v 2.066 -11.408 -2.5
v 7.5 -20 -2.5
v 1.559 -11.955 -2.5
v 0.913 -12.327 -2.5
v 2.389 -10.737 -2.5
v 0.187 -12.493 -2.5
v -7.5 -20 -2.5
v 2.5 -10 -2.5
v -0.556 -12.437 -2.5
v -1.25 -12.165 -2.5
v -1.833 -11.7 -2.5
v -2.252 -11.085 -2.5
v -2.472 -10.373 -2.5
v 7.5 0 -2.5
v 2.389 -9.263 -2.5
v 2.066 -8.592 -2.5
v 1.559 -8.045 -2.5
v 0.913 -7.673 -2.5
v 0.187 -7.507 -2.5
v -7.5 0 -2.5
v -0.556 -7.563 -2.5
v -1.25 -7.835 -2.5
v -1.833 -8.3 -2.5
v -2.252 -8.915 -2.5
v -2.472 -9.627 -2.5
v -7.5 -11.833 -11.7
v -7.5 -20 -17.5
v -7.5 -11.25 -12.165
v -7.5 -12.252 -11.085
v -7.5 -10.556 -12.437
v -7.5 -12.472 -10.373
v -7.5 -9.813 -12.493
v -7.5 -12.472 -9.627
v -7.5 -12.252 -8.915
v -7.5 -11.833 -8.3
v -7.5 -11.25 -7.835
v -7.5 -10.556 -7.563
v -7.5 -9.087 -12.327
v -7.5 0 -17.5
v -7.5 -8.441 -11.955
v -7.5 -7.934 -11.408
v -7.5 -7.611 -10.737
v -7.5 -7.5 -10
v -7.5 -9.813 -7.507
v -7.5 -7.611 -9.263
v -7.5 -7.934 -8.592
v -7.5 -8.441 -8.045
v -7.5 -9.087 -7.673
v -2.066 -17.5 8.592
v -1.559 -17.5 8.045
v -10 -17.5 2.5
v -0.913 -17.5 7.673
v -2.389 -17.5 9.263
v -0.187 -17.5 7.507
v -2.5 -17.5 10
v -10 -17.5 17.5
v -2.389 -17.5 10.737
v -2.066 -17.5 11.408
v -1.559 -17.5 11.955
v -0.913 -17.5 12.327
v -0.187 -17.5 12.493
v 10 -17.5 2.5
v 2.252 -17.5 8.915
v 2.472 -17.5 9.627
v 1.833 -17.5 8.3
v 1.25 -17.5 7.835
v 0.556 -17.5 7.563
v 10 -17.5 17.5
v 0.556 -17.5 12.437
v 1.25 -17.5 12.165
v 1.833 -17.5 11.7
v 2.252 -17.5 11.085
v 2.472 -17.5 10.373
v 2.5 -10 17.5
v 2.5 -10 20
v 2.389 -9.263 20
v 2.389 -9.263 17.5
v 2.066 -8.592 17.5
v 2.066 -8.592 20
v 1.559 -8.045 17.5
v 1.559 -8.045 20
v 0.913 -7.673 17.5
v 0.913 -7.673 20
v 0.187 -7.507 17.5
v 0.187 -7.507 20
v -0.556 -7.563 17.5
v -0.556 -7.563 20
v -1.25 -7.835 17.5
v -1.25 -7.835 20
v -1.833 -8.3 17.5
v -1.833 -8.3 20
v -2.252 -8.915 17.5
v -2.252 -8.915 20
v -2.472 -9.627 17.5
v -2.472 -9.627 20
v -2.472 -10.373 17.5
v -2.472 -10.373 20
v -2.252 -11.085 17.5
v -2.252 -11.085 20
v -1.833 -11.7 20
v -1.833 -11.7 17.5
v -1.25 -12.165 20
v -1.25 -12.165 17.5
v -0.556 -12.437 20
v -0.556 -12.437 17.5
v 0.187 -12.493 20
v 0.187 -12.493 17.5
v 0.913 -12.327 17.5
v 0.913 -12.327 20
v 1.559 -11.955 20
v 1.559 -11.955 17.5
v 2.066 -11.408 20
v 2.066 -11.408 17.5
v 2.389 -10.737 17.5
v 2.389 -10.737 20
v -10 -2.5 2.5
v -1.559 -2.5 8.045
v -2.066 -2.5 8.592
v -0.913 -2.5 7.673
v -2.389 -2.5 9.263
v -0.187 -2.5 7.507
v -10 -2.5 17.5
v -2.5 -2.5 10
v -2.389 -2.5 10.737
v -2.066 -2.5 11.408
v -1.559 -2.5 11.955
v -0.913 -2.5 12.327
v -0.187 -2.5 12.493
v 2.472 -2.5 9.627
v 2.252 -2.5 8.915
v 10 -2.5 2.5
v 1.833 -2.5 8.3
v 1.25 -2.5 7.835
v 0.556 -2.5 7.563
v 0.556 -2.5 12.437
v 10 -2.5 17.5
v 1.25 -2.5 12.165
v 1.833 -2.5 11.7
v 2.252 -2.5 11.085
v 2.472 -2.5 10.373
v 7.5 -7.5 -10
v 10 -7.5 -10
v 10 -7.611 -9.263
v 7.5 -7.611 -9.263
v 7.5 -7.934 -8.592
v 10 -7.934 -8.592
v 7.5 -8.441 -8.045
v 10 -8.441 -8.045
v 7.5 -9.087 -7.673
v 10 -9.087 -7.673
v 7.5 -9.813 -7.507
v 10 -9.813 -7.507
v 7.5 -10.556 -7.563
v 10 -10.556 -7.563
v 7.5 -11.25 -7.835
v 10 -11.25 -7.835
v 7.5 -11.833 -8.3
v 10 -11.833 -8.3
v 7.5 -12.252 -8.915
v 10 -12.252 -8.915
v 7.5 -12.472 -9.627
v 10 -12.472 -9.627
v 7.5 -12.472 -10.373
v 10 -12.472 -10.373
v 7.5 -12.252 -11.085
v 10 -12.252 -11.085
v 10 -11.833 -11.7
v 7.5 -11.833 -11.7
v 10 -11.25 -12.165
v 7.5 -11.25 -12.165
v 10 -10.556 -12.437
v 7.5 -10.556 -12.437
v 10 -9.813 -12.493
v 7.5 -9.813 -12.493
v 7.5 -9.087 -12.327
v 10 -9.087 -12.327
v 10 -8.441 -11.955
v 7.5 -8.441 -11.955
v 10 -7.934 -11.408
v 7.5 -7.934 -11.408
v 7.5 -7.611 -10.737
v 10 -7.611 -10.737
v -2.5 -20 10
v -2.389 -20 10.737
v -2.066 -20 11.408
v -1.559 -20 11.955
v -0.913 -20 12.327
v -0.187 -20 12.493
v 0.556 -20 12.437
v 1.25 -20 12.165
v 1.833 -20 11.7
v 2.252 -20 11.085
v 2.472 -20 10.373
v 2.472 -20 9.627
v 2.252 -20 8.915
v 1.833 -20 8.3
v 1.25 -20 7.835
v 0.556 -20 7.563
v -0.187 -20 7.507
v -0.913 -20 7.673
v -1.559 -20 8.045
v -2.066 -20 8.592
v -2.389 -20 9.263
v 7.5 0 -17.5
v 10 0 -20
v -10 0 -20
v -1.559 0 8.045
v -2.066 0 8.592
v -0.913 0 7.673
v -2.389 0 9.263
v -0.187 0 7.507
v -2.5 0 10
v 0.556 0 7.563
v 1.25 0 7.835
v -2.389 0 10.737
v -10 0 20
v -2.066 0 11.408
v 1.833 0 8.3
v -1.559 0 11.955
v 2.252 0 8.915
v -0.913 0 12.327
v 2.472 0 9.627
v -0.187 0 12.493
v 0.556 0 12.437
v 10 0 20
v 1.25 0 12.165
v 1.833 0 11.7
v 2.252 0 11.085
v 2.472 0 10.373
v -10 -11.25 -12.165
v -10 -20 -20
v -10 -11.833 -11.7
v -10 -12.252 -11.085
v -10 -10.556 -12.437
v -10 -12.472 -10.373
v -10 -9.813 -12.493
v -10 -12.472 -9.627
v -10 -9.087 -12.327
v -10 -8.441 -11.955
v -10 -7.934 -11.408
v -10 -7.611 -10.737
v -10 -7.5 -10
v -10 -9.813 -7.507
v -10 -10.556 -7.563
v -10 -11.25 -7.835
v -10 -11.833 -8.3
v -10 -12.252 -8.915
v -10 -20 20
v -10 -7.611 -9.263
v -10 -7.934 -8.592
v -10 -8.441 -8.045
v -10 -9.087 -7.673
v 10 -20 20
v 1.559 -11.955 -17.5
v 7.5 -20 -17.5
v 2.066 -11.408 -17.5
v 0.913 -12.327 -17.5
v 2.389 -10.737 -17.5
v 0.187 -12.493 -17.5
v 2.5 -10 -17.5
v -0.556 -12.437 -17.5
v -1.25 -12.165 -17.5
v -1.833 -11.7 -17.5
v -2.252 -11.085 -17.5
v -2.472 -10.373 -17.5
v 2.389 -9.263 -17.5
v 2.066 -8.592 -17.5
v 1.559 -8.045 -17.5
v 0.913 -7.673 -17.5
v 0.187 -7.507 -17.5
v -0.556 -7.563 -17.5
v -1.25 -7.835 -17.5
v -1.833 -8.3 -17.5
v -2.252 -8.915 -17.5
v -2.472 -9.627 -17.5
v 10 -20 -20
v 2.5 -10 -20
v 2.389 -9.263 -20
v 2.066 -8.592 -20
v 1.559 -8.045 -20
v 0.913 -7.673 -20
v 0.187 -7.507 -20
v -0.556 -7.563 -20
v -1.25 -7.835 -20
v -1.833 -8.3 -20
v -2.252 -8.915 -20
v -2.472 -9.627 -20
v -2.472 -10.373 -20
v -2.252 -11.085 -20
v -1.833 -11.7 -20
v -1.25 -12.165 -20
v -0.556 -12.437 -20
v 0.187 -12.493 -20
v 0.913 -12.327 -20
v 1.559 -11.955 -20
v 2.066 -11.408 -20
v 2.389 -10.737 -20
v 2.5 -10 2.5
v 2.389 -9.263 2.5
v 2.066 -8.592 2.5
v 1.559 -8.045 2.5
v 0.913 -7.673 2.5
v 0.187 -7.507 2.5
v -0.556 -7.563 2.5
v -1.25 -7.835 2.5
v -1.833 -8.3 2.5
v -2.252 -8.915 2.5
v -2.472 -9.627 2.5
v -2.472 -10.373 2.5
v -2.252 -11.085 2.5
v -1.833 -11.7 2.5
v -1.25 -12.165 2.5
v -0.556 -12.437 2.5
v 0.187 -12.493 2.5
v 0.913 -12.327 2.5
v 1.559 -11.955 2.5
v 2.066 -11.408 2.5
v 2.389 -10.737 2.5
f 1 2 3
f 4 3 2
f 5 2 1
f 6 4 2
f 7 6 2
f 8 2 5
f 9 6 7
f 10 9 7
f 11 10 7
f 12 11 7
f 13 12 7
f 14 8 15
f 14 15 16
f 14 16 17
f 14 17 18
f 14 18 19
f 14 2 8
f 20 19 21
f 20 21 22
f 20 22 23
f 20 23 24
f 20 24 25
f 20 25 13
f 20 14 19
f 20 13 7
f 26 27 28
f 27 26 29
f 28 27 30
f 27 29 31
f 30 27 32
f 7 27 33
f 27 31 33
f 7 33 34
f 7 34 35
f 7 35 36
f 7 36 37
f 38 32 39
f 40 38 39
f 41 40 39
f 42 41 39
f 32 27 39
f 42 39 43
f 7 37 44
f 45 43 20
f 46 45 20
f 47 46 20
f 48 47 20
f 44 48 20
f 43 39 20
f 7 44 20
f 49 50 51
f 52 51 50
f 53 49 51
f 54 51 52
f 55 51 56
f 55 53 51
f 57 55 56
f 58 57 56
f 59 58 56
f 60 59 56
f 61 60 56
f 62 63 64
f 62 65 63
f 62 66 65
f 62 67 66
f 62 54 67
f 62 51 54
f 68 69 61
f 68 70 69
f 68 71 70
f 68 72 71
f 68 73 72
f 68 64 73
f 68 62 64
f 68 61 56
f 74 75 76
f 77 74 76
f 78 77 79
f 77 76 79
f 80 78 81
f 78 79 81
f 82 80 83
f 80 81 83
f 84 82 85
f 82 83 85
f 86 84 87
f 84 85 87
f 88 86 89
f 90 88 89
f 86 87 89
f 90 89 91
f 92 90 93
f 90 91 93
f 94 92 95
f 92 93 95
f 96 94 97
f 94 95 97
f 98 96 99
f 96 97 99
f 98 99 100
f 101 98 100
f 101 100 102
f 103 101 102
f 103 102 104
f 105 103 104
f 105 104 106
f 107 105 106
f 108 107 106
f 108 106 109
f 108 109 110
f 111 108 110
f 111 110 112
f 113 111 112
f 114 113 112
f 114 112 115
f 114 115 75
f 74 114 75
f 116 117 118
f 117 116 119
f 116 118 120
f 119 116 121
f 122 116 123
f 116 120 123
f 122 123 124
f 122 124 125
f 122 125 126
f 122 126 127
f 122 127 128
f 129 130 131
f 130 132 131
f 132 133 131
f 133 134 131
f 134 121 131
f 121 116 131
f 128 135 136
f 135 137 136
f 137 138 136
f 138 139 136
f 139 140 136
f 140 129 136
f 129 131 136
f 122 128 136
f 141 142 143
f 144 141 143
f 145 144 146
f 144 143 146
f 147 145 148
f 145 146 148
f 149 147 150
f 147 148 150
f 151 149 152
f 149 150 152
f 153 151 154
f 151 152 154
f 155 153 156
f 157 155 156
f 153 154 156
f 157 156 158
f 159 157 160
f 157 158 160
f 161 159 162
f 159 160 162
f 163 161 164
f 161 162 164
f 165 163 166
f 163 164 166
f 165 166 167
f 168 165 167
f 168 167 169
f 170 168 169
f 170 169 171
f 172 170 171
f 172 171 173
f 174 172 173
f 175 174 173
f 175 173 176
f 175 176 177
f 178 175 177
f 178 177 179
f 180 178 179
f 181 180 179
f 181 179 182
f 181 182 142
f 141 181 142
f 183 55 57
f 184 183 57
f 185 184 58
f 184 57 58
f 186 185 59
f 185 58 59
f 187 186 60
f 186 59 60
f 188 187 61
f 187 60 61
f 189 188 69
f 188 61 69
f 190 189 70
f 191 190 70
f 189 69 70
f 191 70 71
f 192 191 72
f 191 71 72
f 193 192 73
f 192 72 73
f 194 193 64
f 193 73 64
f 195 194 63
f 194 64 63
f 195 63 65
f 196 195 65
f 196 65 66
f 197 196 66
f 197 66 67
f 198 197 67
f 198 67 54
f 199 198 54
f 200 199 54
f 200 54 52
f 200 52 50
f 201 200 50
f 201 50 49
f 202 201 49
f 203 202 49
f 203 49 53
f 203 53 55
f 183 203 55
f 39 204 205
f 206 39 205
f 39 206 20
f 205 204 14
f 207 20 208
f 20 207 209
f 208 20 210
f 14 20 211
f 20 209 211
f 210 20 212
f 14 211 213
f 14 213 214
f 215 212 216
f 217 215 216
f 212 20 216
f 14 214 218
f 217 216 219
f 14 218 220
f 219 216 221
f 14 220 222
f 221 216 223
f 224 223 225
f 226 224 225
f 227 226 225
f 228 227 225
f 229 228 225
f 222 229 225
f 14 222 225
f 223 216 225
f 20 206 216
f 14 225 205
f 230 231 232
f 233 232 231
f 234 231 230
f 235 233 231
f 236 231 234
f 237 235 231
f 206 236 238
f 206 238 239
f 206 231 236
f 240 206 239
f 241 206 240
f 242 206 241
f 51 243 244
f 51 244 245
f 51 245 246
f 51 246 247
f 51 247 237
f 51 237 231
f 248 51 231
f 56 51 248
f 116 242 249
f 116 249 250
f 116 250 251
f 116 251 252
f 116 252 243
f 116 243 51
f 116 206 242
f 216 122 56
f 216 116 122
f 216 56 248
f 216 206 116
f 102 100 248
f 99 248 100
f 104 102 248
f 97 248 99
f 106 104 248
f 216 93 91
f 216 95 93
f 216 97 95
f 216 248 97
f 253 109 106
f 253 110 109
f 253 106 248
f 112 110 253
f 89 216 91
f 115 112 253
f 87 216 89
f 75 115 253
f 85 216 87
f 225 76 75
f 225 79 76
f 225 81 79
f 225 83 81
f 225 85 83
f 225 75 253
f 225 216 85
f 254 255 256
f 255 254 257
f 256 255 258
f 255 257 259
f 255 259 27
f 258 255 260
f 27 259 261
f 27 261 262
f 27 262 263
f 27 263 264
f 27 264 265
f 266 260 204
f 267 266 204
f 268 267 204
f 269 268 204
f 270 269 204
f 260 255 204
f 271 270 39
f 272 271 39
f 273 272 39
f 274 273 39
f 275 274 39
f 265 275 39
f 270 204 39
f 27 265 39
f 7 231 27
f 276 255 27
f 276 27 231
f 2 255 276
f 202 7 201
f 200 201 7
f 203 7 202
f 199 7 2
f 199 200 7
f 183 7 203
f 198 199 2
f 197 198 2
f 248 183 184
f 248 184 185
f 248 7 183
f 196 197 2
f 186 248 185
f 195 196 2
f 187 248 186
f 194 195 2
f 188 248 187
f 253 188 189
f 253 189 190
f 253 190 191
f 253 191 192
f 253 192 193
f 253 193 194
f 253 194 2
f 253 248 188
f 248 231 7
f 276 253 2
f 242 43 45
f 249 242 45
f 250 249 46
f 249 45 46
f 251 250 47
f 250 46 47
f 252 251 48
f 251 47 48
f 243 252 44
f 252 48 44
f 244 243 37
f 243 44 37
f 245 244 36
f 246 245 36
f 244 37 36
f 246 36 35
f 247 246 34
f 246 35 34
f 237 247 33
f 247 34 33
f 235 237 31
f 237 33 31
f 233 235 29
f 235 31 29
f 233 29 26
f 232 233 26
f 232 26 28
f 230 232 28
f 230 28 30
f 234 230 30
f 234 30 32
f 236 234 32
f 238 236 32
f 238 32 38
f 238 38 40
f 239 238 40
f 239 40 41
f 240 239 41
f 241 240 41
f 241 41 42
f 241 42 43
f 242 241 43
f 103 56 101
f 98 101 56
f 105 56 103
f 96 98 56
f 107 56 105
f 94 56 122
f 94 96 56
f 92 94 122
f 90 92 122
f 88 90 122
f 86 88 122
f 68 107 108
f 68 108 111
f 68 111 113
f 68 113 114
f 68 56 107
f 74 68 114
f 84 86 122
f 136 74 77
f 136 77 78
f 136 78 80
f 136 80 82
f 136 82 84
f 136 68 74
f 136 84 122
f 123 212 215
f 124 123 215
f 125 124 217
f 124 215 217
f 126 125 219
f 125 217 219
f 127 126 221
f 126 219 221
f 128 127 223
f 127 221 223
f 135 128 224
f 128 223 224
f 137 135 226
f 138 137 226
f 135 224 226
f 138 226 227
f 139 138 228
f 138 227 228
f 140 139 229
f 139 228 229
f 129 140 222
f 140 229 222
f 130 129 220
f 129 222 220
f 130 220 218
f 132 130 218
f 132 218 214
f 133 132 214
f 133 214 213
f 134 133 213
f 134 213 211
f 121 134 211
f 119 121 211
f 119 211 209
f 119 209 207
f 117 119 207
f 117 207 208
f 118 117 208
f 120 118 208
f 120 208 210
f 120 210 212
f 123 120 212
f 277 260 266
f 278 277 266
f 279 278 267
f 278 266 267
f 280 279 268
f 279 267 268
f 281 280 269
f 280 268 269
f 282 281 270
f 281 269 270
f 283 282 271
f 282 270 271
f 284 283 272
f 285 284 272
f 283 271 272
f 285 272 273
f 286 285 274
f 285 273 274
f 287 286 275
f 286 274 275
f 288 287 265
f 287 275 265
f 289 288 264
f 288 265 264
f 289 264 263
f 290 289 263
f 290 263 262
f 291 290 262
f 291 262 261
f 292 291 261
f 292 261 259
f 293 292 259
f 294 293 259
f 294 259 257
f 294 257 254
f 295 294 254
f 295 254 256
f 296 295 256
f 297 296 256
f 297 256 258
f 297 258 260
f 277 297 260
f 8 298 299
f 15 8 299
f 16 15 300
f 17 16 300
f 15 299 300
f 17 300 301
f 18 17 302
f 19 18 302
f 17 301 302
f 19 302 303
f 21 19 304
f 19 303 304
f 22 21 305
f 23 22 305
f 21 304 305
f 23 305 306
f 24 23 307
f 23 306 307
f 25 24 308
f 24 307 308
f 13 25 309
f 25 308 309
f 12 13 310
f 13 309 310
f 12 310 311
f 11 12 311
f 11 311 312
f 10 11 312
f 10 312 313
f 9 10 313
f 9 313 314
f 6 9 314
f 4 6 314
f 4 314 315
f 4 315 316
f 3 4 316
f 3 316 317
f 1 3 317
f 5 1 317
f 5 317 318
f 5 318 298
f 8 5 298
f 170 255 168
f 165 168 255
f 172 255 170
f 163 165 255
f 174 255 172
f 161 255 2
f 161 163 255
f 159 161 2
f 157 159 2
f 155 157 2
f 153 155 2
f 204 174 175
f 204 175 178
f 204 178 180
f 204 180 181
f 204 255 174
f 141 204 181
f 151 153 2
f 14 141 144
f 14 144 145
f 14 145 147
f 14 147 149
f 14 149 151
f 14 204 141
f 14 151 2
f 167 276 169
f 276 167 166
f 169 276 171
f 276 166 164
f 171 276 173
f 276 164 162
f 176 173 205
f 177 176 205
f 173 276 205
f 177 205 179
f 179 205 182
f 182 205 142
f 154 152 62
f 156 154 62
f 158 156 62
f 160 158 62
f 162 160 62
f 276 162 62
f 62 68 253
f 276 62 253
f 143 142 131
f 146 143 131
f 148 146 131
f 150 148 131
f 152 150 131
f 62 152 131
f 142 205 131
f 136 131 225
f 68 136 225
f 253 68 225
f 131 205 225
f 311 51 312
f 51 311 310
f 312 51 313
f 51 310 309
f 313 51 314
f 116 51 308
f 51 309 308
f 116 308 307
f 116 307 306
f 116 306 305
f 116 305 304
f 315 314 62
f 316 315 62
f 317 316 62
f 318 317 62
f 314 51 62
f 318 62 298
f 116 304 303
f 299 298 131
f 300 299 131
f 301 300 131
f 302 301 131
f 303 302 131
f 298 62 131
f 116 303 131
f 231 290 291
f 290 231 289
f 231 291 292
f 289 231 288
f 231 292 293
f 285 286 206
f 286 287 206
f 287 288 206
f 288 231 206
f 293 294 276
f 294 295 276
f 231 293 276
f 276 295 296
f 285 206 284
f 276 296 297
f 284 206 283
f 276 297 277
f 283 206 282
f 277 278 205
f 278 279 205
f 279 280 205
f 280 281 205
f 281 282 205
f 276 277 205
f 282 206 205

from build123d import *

# Parameters (mm, degrees)
F0_W     = 20
F0_H     = 40
F1_DEPTH = 20
F2_W     = 15
F2_H     = 15
F2_R     = 2.5
F3_DEPTH = 20.001
F4_W     = 15
F4_H     = 15
F4_R     = 2.5
F5_DEPTH = 20.001
F6_R     = 2.5
F7_DEPTH = 40.001


with BuildPart() as f1:
    # F0 (on Front) → F1 (new body)
    with BuildSketch(Plane.XZ):
        Rectangle(F0_W, F0_H)
    extrude(amount=F1_DEPTH)

    # F2 (on face) → F3 (cut, through all)
    with BuildSketch(Plane.YZ.offset(10)):
        with Locations((-10, 10)):
            Rectangle(F2_W, F2_H)
        with Locations((-10, -10)):
            Circle(F2_R)
    extrude(amount=-F3_DEPTH, mode=Mode.SUBTRACT)

    # F4 (on face) → F5 (cut, through all)
    with BuildSketch(Plane(origin=(0, 0, 0), x_dir=(-1, 0, 0), z_dir=(0, 1, 0))):
        with Locations((0, -10)):
            Rectangle(F4_W, F4_H)
        with Locations((0, 10)):
            Circle(F4_R)
    extrude(amount=-F5_DEPTH, mode=Mode.SUBTRACT)

    # F6 (on face) → F7 (cut, through all)
    with BuildSketch(Plane.XY.offset(20)):
        with Locations((0, -10)):
            Circle(F6_R)
    extrude(amount=-F7_DEPTH, mode=Mode.SUBTRACT)


solid = f1.part
